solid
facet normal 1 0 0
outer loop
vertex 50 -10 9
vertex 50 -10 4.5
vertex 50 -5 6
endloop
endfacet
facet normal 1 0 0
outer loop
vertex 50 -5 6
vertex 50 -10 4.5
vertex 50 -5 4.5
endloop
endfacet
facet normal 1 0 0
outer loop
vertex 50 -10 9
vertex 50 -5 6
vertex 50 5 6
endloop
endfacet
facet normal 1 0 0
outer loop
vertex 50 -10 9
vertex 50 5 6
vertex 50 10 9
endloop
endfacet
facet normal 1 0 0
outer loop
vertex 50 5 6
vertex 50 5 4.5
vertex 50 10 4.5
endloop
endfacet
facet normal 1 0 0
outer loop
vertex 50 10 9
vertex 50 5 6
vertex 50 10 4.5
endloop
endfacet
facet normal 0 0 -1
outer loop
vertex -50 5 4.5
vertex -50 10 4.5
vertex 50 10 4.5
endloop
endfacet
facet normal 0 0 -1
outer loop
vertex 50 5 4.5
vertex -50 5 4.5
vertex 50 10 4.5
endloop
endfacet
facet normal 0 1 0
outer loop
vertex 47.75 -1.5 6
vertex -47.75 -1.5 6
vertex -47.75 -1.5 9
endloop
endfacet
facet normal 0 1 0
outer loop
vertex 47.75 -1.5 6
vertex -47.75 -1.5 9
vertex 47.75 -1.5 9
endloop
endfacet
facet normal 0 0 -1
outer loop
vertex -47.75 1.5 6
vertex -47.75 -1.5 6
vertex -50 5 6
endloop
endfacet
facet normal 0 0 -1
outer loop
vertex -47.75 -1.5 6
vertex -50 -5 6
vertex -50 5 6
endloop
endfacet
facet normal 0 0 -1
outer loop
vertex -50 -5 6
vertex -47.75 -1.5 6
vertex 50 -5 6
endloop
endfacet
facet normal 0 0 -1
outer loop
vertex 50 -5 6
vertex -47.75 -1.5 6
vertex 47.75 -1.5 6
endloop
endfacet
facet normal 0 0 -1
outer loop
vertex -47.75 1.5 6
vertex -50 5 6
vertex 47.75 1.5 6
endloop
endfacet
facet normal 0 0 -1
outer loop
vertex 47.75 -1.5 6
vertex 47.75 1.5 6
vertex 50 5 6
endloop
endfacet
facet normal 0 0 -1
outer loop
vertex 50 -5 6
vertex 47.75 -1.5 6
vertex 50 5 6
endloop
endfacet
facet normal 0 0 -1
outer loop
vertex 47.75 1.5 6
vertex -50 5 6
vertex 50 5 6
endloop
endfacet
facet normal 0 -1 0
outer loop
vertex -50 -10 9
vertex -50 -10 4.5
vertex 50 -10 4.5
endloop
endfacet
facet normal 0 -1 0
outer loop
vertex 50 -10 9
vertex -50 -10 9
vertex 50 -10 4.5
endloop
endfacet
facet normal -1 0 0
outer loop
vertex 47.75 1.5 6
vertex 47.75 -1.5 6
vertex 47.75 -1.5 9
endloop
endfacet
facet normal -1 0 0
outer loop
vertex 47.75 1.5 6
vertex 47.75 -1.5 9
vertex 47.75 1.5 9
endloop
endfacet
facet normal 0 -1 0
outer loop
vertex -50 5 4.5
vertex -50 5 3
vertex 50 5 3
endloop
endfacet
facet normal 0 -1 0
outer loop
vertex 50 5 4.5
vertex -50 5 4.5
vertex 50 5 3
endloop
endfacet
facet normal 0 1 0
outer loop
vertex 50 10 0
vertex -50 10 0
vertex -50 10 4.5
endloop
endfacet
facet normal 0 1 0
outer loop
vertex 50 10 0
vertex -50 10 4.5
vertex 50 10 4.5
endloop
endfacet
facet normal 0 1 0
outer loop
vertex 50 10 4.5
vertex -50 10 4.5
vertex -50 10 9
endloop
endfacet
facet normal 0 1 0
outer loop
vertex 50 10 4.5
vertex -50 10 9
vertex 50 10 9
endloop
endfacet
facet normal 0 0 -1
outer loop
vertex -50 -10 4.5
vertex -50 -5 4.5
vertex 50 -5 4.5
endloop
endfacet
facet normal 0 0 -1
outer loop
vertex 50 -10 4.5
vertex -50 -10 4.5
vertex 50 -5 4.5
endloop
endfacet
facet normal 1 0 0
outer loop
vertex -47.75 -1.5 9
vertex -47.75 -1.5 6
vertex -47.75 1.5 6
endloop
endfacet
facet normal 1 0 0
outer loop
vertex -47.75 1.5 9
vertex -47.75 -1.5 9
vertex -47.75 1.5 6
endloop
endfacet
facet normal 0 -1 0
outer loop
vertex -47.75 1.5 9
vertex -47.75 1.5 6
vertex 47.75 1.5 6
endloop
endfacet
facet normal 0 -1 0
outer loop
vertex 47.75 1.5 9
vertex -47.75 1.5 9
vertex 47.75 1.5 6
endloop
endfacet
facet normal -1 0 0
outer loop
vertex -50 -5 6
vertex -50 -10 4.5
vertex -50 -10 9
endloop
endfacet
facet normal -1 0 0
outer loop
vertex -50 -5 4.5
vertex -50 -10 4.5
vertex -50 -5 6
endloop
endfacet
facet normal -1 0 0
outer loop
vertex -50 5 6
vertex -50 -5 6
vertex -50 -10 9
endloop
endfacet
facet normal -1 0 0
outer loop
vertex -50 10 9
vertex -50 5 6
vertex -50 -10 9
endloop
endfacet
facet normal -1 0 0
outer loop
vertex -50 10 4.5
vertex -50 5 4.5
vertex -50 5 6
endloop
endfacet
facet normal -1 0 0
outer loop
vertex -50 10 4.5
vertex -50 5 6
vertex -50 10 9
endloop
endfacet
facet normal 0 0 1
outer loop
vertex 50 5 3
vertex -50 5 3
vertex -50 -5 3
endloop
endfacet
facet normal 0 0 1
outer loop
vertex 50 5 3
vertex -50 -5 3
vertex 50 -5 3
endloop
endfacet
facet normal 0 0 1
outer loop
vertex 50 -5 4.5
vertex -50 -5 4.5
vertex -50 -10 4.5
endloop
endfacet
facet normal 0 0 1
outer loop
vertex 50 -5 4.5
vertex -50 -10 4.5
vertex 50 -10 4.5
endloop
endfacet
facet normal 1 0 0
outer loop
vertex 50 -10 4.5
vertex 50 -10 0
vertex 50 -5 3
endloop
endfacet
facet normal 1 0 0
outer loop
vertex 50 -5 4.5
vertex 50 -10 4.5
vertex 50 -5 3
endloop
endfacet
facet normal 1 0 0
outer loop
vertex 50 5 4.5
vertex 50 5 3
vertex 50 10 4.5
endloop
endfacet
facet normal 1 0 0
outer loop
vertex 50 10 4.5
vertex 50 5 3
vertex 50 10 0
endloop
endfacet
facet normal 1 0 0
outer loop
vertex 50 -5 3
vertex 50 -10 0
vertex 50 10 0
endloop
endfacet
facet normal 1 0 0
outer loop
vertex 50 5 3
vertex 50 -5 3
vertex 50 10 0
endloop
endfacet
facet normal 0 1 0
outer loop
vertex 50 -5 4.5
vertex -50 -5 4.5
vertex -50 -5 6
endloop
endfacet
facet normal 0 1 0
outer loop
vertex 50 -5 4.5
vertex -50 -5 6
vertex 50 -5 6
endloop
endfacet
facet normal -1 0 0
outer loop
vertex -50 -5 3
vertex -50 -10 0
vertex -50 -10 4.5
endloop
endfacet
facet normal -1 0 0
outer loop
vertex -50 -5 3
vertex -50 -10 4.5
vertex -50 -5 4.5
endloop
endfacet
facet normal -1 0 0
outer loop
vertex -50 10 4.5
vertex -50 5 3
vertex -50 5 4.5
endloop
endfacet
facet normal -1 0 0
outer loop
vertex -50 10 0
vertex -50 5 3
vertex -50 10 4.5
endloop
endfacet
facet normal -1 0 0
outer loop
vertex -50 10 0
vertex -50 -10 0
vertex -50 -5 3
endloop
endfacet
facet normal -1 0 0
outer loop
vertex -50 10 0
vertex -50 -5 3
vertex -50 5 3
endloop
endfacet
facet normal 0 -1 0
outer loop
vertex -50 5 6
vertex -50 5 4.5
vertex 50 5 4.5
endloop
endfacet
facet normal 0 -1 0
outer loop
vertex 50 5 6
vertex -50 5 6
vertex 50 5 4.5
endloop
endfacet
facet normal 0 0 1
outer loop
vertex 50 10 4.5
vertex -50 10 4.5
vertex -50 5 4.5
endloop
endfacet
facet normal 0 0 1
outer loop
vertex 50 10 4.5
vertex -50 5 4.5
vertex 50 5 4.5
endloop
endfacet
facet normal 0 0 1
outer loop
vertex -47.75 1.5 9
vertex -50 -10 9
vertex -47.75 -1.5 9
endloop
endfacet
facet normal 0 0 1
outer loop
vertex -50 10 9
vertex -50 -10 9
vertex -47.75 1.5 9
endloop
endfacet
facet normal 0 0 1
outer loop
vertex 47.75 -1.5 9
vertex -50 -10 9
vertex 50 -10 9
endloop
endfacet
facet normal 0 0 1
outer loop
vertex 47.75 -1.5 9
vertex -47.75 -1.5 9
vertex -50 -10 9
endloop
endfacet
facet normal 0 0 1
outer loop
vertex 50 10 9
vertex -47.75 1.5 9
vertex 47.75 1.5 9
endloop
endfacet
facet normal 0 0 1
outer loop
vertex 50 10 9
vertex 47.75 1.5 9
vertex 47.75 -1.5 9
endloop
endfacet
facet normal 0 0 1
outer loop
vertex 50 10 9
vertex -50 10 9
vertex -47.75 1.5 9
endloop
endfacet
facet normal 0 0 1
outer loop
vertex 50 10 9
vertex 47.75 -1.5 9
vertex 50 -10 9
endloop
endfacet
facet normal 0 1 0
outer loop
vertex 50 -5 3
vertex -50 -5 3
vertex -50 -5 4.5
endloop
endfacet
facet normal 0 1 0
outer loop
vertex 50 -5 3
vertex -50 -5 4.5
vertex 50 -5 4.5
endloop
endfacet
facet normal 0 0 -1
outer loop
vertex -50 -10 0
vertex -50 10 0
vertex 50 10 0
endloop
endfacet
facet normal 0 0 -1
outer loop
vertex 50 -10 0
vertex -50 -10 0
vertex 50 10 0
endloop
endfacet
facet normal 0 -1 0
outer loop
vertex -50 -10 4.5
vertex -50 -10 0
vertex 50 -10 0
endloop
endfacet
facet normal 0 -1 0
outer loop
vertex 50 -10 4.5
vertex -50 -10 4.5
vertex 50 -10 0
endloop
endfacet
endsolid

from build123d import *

# Parameters (mm, degrees)
BOX_BOTTOM_HALF_0_W     = 102
BOX_BOTTOM_HALF_0_H     = 22
BOX_BOTTOM_HALF_0_DEPTH = 5.5
SKETCH_W                = 100
SKETCH_H                = 20
PAD_DEPTH               = 3
SKETCH001_W             = 100
SKETCH001_H             = 5
PAD001_DEPTH            = 3
SKETCH002_W             = 100
SKETCH002_H             = 20
SKETCH002_W_2           = 95.5
SKETCH002_H_2           = 3
PAD002_DEPTH            = 3


with BuildPart() as box_bottom_half_0_body:
    # box_bottom_half_0 → box_bottom_half_0 (new body)
    with BuildSketch(Plane(origin=(-51, -11, -1), x_dir=(1, 0, 0), z_dir=(0, 0, 1))):
        with Locations((51, 11)):
            Rectangle(BOX_BOTTOM_HALF_0_W, BOX_BOTTOM_HALF_0_H)
    extrude(amount=BOX_BOTTOM_HALF_0_DEPTH)


with BuildPart() as body:
    # Sketch → Pad (new body)
    with BuildSketch(Plane.XY):
        Rectangle(SKETCH_W, SKETCH_H)
    extrude(amount=PAD_DEPTH)

    # Sketch001 (on Face6 of Pad) → Pad001 (join)
    with BuildSketch(Plane.XY.offset(3)):
        with Locations((0, 7.5)):
            Rectangle(SKETCH001_W, SKETCH001_H)
        with Locations((0, -7.5)):
            Rectangle(SKETCH001_W, SKETCH001_H)
    extrude(amount=PAD001_DEPTH)

    # Sketch002 (on Face12 of Pad001) → Pad002 (join)
    with BuildSketch(Plane.XY.offset(6)):
        Rectangle(SKETCH002_W, SKETCH002_H)
        Rectangle(SKETCH002_W_2, SKETCH002_H_2, mode=Mode.SUBTRACT)
    extrude(amount=PAD002_DEPTH)


with BuildPart() as bottom_half_0_body:
    # bottom_half_0 base: copy of Body
    add(body.part)

    # bottom_half_0: intersect box_bottom_half_0 body
    add(box_bottom_half_0_body.part, mode=Mode.INTERSECT)


with BuildPart() as top_half_0_body:
    # top_half_0 base: copy of Body
    add(body.part)

    # top_half_0: cut box_bottom_half_0 body
    add(box_bottom_half_0_body.part, mode=Mode.SUBTRACT)


solid = Compound([bottom_half_0_body.part, top_half_0_body.part])
